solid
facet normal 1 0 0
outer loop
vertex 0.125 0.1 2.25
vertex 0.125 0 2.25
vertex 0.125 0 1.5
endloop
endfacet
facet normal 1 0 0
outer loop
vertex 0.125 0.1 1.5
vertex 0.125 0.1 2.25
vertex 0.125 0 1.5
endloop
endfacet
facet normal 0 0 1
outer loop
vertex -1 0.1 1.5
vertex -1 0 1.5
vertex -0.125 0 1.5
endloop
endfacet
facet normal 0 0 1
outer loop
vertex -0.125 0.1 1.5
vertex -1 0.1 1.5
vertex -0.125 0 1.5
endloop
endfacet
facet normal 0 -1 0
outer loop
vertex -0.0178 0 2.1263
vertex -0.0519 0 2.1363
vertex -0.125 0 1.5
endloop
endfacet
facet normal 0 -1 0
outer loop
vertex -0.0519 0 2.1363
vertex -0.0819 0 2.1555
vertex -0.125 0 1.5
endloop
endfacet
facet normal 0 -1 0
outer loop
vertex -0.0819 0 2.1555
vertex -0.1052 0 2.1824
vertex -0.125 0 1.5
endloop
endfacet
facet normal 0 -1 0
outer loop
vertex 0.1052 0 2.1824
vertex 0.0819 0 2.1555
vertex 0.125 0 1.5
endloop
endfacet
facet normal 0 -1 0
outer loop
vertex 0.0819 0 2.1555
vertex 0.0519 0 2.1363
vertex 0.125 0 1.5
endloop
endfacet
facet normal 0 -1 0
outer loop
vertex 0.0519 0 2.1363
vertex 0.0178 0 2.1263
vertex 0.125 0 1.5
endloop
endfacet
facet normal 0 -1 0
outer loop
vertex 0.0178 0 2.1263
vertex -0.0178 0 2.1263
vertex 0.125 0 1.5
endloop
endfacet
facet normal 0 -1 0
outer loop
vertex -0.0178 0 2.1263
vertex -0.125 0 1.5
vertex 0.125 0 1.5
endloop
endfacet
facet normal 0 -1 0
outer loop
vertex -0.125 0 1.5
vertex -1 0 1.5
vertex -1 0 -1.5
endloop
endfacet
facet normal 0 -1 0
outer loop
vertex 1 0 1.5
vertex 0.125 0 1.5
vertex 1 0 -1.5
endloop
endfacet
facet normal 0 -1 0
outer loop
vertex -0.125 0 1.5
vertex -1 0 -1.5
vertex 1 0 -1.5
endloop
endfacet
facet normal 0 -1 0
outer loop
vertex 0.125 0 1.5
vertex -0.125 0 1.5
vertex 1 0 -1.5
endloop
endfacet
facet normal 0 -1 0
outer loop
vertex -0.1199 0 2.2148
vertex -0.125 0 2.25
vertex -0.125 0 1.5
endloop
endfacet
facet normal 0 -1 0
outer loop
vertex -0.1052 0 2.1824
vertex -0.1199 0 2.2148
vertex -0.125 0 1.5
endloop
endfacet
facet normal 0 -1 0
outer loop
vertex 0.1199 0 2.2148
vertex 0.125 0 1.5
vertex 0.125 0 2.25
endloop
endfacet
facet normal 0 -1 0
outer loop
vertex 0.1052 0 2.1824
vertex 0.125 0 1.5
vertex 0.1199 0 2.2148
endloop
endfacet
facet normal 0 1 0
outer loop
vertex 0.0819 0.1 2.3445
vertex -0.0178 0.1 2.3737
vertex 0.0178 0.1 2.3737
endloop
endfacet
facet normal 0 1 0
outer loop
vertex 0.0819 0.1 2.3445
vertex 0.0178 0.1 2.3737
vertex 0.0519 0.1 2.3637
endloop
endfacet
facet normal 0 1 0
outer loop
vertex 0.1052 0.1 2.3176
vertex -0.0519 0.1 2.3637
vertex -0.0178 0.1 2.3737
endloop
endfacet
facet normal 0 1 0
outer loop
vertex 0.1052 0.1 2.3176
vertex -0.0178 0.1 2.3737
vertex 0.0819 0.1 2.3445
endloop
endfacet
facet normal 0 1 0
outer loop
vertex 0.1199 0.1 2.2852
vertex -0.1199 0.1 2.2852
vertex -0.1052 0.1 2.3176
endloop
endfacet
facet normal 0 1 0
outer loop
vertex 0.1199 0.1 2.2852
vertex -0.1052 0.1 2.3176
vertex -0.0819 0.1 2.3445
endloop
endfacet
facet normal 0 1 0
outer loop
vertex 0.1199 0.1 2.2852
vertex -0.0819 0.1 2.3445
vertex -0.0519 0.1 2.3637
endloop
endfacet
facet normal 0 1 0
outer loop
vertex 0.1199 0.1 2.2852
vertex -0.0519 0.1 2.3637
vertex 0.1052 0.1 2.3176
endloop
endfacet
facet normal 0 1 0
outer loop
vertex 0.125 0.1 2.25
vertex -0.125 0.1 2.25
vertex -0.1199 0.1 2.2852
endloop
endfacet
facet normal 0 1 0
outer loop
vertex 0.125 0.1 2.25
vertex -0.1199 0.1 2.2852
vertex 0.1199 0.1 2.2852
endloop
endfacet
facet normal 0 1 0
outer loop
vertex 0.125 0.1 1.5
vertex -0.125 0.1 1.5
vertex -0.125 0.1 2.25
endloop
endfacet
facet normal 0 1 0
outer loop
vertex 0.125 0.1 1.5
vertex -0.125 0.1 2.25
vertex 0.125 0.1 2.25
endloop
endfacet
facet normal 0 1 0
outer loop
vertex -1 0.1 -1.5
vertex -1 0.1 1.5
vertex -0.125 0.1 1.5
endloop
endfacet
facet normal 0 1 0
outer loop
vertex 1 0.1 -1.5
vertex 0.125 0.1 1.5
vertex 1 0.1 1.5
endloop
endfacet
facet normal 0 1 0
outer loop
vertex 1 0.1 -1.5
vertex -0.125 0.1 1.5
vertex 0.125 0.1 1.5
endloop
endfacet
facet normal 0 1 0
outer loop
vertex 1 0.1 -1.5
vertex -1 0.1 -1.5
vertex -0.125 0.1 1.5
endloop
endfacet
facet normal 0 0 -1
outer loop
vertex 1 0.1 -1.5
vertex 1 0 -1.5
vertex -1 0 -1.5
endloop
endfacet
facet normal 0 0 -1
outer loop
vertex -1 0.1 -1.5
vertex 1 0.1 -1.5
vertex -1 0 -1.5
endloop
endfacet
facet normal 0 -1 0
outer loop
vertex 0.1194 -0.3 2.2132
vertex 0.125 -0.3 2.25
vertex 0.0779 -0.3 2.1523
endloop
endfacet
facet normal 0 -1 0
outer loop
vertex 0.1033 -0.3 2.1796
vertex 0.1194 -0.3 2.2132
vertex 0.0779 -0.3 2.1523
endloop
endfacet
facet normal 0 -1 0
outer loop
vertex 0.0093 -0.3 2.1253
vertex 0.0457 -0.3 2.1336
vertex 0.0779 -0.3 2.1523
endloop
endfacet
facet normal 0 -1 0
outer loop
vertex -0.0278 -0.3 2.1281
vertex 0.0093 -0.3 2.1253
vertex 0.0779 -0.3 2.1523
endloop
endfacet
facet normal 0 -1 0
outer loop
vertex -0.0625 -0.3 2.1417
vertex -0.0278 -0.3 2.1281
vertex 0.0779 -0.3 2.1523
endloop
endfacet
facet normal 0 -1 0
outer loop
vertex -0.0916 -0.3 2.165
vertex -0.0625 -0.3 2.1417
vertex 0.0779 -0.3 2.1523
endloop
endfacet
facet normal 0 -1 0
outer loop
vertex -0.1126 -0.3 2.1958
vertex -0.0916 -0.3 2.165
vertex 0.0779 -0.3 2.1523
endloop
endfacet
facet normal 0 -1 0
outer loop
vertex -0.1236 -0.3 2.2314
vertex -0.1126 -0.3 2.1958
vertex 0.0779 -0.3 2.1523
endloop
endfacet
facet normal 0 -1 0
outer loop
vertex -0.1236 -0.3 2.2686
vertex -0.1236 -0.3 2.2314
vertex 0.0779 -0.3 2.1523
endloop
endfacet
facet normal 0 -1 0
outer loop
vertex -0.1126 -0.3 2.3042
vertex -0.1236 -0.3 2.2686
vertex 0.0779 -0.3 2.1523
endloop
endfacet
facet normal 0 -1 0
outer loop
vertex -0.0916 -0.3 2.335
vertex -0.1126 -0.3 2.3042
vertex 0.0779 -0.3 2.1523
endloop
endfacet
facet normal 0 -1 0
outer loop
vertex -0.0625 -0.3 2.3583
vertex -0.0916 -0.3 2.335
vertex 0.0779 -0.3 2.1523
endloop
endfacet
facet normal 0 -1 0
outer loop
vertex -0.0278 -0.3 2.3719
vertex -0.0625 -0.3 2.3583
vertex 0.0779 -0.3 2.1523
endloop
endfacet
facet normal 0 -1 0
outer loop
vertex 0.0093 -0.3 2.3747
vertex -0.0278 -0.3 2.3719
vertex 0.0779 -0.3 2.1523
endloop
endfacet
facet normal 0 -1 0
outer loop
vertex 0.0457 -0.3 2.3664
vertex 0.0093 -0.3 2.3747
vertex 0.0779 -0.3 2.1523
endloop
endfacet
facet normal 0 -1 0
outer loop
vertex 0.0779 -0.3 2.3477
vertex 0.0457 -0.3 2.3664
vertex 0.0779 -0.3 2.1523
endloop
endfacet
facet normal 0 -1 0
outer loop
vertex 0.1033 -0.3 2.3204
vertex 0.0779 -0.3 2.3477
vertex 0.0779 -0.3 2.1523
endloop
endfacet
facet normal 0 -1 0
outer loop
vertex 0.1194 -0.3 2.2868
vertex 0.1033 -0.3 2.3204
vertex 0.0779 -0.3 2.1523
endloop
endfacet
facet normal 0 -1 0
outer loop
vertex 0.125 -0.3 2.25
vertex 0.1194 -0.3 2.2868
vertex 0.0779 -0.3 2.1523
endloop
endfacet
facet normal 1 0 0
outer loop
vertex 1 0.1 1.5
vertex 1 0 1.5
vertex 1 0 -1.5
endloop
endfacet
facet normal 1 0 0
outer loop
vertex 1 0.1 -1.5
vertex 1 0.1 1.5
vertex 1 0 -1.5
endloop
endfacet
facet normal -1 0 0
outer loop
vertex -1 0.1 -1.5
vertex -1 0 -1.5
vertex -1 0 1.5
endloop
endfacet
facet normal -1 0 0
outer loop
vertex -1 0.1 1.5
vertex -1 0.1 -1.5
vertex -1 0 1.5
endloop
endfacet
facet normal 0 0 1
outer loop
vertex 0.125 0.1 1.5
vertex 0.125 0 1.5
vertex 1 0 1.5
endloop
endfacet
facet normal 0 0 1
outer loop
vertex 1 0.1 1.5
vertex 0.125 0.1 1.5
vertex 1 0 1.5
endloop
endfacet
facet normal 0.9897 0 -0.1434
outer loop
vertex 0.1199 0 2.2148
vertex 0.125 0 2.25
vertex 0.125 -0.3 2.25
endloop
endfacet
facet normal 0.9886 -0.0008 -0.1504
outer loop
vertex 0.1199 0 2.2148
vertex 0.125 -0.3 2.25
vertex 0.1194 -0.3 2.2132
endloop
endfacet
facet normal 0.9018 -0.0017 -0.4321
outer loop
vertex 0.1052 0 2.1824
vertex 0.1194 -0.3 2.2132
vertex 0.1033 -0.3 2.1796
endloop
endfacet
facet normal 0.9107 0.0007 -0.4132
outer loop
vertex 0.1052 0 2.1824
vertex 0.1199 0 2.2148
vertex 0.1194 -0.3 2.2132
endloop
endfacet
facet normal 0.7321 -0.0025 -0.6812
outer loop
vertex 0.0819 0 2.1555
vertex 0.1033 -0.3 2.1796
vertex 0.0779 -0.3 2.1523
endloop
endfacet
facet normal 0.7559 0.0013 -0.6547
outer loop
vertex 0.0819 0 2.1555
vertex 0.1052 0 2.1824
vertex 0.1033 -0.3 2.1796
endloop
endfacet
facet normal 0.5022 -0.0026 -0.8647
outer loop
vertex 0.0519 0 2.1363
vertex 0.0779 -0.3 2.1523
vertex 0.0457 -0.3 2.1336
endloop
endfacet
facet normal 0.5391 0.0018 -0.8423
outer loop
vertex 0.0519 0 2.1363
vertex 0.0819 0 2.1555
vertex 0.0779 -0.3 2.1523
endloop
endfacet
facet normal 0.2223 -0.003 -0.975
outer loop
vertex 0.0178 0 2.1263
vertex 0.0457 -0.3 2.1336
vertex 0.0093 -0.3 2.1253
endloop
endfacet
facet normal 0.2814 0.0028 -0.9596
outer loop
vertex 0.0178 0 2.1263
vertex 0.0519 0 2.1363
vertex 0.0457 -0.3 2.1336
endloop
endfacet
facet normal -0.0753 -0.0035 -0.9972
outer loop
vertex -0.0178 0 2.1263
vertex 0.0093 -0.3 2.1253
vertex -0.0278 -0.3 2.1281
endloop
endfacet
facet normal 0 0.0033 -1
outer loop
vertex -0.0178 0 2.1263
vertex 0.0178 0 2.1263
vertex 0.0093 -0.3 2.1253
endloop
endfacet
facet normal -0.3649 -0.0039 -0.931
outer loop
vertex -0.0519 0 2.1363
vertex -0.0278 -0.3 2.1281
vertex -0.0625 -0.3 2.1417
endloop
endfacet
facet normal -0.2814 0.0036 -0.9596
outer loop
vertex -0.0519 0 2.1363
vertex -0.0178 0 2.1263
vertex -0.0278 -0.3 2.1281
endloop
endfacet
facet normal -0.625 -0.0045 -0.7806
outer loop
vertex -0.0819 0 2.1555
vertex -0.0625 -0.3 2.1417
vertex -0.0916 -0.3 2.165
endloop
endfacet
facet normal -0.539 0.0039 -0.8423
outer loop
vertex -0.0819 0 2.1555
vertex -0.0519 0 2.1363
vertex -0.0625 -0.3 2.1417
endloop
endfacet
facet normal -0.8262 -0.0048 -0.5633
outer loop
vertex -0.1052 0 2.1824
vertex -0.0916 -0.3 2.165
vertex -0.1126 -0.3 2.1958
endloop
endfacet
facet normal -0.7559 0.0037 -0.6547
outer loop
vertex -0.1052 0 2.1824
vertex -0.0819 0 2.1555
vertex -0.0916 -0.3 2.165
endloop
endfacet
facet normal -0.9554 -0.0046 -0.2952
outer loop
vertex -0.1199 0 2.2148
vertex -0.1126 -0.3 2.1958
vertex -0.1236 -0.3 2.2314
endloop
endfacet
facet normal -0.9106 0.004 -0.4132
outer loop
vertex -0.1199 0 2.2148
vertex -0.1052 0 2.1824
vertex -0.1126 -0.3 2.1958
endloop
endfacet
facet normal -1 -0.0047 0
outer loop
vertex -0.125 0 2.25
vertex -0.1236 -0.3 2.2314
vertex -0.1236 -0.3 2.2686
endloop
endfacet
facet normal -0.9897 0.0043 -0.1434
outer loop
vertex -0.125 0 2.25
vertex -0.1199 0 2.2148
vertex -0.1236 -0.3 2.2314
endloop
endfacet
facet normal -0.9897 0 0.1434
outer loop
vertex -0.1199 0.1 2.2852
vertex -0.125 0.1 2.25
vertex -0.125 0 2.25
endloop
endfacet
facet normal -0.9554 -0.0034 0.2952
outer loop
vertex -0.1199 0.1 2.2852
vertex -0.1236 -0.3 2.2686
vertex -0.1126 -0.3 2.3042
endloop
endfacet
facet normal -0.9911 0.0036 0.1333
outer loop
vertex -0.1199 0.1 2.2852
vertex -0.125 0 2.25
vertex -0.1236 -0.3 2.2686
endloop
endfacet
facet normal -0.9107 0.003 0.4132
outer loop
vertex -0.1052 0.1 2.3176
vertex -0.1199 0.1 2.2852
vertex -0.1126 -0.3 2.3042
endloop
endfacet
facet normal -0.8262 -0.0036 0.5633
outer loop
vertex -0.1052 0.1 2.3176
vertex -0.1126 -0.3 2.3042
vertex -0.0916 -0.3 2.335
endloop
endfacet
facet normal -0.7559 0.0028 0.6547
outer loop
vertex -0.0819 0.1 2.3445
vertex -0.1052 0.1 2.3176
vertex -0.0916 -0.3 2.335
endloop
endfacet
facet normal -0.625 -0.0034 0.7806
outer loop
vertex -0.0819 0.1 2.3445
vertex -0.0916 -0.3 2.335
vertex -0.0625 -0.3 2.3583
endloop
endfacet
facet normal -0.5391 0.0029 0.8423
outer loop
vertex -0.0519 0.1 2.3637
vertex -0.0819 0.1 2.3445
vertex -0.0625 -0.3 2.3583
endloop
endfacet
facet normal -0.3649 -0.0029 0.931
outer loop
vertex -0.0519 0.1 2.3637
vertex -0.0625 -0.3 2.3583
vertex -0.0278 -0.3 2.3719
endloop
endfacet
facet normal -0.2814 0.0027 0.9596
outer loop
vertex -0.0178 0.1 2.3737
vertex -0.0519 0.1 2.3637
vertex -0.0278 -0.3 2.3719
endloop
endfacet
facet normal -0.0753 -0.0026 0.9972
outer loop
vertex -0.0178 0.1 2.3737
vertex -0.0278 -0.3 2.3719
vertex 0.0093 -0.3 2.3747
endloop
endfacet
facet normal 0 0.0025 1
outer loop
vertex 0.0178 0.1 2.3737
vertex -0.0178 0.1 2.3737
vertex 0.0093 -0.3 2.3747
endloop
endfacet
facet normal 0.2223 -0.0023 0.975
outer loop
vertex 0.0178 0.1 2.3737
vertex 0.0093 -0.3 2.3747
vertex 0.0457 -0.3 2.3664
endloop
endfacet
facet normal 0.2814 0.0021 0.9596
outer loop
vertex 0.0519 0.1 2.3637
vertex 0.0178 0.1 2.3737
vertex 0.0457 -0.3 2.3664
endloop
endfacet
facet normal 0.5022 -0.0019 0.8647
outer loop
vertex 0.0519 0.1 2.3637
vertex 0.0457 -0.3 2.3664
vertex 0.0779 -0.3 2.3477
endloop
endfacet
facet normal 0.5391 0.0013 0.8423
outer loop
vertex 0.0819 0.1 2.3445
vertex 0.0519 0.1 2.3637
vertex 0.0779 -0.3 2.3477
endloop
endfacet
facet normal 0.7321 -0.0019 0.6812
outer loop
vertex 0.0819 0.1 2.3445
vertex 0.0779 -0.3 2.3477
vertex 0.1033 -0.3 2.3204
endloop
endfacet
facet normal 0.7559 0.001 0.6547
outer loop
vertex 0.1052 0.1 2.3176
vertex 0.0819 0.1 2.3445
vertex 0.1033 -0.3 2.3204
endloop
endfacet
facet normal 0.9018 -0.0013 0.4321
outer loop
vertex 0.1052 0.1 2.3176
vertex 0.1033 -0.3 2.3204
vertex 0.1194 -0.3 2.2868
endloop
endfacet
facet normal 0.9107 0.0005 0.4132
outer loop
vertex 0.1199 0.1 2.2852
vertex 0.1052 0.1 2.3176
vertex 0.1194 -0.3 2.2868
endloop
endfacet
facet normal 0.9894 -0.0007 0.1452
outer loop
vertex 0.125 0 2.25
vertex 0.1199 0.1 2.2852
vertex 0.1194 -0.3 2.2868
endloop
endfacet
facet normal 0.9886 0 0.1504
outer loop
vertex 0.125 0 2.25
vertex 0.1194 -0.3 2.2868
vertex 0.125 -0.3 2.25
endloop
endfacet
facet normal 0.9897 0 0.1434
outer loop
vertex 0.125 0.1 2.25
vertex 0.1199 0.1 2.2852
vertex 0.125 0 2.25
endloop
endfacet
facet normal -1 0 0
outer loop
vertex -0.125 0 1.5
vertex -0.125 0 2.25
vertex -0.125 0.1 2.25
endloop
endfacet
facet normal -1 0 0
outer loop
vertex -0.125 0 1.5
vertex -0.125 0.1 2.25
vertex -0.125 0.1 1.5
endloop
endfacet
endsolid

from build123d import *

# Parameters (mm, degrees)
SKETCH_1_W      = 0.25
SKETCH_1_H      = 0.75
EXTRUDE_1_DEPTH = 0.1
SKETCH_2_R      = 0.125
EXTRUDE_2_DEPTH = 0.4


with BuildPart() as part:
    # Эскиз1 → Бобышка-Вытянуть1 (new body)
    with BuildSketch(Plane(origin=(0, 0, 0), x_dir=(1, 0, 0), z_dir=(0, 1, 0))):
        Polygon((-1, -1.5), (-0.125, -1.5), (0.125, -1.5), (1, -1.5), (1, 1.5), (-1, 1.5), align=None)
        with Locations((0, -1.875)):
            Rectangle(SKETCH_1_W, SKETCH_1_H)
    extrude(amount=EXTRUDE_1_DEPTH)

    # Эскиз2 → Бобышка-Вытянуть2 (add)
    with BuildSketch(Plane(origin=(0, 0.1, 0), x_dir=(1, 0, 0), z_dir=(0, 1, 0))):
        with Locations((0, -2.25)):
            Circle(SKETCH_2_R)
    extrude(amount=-EXTRUDE_2_DEPTH)


solid = part.part
